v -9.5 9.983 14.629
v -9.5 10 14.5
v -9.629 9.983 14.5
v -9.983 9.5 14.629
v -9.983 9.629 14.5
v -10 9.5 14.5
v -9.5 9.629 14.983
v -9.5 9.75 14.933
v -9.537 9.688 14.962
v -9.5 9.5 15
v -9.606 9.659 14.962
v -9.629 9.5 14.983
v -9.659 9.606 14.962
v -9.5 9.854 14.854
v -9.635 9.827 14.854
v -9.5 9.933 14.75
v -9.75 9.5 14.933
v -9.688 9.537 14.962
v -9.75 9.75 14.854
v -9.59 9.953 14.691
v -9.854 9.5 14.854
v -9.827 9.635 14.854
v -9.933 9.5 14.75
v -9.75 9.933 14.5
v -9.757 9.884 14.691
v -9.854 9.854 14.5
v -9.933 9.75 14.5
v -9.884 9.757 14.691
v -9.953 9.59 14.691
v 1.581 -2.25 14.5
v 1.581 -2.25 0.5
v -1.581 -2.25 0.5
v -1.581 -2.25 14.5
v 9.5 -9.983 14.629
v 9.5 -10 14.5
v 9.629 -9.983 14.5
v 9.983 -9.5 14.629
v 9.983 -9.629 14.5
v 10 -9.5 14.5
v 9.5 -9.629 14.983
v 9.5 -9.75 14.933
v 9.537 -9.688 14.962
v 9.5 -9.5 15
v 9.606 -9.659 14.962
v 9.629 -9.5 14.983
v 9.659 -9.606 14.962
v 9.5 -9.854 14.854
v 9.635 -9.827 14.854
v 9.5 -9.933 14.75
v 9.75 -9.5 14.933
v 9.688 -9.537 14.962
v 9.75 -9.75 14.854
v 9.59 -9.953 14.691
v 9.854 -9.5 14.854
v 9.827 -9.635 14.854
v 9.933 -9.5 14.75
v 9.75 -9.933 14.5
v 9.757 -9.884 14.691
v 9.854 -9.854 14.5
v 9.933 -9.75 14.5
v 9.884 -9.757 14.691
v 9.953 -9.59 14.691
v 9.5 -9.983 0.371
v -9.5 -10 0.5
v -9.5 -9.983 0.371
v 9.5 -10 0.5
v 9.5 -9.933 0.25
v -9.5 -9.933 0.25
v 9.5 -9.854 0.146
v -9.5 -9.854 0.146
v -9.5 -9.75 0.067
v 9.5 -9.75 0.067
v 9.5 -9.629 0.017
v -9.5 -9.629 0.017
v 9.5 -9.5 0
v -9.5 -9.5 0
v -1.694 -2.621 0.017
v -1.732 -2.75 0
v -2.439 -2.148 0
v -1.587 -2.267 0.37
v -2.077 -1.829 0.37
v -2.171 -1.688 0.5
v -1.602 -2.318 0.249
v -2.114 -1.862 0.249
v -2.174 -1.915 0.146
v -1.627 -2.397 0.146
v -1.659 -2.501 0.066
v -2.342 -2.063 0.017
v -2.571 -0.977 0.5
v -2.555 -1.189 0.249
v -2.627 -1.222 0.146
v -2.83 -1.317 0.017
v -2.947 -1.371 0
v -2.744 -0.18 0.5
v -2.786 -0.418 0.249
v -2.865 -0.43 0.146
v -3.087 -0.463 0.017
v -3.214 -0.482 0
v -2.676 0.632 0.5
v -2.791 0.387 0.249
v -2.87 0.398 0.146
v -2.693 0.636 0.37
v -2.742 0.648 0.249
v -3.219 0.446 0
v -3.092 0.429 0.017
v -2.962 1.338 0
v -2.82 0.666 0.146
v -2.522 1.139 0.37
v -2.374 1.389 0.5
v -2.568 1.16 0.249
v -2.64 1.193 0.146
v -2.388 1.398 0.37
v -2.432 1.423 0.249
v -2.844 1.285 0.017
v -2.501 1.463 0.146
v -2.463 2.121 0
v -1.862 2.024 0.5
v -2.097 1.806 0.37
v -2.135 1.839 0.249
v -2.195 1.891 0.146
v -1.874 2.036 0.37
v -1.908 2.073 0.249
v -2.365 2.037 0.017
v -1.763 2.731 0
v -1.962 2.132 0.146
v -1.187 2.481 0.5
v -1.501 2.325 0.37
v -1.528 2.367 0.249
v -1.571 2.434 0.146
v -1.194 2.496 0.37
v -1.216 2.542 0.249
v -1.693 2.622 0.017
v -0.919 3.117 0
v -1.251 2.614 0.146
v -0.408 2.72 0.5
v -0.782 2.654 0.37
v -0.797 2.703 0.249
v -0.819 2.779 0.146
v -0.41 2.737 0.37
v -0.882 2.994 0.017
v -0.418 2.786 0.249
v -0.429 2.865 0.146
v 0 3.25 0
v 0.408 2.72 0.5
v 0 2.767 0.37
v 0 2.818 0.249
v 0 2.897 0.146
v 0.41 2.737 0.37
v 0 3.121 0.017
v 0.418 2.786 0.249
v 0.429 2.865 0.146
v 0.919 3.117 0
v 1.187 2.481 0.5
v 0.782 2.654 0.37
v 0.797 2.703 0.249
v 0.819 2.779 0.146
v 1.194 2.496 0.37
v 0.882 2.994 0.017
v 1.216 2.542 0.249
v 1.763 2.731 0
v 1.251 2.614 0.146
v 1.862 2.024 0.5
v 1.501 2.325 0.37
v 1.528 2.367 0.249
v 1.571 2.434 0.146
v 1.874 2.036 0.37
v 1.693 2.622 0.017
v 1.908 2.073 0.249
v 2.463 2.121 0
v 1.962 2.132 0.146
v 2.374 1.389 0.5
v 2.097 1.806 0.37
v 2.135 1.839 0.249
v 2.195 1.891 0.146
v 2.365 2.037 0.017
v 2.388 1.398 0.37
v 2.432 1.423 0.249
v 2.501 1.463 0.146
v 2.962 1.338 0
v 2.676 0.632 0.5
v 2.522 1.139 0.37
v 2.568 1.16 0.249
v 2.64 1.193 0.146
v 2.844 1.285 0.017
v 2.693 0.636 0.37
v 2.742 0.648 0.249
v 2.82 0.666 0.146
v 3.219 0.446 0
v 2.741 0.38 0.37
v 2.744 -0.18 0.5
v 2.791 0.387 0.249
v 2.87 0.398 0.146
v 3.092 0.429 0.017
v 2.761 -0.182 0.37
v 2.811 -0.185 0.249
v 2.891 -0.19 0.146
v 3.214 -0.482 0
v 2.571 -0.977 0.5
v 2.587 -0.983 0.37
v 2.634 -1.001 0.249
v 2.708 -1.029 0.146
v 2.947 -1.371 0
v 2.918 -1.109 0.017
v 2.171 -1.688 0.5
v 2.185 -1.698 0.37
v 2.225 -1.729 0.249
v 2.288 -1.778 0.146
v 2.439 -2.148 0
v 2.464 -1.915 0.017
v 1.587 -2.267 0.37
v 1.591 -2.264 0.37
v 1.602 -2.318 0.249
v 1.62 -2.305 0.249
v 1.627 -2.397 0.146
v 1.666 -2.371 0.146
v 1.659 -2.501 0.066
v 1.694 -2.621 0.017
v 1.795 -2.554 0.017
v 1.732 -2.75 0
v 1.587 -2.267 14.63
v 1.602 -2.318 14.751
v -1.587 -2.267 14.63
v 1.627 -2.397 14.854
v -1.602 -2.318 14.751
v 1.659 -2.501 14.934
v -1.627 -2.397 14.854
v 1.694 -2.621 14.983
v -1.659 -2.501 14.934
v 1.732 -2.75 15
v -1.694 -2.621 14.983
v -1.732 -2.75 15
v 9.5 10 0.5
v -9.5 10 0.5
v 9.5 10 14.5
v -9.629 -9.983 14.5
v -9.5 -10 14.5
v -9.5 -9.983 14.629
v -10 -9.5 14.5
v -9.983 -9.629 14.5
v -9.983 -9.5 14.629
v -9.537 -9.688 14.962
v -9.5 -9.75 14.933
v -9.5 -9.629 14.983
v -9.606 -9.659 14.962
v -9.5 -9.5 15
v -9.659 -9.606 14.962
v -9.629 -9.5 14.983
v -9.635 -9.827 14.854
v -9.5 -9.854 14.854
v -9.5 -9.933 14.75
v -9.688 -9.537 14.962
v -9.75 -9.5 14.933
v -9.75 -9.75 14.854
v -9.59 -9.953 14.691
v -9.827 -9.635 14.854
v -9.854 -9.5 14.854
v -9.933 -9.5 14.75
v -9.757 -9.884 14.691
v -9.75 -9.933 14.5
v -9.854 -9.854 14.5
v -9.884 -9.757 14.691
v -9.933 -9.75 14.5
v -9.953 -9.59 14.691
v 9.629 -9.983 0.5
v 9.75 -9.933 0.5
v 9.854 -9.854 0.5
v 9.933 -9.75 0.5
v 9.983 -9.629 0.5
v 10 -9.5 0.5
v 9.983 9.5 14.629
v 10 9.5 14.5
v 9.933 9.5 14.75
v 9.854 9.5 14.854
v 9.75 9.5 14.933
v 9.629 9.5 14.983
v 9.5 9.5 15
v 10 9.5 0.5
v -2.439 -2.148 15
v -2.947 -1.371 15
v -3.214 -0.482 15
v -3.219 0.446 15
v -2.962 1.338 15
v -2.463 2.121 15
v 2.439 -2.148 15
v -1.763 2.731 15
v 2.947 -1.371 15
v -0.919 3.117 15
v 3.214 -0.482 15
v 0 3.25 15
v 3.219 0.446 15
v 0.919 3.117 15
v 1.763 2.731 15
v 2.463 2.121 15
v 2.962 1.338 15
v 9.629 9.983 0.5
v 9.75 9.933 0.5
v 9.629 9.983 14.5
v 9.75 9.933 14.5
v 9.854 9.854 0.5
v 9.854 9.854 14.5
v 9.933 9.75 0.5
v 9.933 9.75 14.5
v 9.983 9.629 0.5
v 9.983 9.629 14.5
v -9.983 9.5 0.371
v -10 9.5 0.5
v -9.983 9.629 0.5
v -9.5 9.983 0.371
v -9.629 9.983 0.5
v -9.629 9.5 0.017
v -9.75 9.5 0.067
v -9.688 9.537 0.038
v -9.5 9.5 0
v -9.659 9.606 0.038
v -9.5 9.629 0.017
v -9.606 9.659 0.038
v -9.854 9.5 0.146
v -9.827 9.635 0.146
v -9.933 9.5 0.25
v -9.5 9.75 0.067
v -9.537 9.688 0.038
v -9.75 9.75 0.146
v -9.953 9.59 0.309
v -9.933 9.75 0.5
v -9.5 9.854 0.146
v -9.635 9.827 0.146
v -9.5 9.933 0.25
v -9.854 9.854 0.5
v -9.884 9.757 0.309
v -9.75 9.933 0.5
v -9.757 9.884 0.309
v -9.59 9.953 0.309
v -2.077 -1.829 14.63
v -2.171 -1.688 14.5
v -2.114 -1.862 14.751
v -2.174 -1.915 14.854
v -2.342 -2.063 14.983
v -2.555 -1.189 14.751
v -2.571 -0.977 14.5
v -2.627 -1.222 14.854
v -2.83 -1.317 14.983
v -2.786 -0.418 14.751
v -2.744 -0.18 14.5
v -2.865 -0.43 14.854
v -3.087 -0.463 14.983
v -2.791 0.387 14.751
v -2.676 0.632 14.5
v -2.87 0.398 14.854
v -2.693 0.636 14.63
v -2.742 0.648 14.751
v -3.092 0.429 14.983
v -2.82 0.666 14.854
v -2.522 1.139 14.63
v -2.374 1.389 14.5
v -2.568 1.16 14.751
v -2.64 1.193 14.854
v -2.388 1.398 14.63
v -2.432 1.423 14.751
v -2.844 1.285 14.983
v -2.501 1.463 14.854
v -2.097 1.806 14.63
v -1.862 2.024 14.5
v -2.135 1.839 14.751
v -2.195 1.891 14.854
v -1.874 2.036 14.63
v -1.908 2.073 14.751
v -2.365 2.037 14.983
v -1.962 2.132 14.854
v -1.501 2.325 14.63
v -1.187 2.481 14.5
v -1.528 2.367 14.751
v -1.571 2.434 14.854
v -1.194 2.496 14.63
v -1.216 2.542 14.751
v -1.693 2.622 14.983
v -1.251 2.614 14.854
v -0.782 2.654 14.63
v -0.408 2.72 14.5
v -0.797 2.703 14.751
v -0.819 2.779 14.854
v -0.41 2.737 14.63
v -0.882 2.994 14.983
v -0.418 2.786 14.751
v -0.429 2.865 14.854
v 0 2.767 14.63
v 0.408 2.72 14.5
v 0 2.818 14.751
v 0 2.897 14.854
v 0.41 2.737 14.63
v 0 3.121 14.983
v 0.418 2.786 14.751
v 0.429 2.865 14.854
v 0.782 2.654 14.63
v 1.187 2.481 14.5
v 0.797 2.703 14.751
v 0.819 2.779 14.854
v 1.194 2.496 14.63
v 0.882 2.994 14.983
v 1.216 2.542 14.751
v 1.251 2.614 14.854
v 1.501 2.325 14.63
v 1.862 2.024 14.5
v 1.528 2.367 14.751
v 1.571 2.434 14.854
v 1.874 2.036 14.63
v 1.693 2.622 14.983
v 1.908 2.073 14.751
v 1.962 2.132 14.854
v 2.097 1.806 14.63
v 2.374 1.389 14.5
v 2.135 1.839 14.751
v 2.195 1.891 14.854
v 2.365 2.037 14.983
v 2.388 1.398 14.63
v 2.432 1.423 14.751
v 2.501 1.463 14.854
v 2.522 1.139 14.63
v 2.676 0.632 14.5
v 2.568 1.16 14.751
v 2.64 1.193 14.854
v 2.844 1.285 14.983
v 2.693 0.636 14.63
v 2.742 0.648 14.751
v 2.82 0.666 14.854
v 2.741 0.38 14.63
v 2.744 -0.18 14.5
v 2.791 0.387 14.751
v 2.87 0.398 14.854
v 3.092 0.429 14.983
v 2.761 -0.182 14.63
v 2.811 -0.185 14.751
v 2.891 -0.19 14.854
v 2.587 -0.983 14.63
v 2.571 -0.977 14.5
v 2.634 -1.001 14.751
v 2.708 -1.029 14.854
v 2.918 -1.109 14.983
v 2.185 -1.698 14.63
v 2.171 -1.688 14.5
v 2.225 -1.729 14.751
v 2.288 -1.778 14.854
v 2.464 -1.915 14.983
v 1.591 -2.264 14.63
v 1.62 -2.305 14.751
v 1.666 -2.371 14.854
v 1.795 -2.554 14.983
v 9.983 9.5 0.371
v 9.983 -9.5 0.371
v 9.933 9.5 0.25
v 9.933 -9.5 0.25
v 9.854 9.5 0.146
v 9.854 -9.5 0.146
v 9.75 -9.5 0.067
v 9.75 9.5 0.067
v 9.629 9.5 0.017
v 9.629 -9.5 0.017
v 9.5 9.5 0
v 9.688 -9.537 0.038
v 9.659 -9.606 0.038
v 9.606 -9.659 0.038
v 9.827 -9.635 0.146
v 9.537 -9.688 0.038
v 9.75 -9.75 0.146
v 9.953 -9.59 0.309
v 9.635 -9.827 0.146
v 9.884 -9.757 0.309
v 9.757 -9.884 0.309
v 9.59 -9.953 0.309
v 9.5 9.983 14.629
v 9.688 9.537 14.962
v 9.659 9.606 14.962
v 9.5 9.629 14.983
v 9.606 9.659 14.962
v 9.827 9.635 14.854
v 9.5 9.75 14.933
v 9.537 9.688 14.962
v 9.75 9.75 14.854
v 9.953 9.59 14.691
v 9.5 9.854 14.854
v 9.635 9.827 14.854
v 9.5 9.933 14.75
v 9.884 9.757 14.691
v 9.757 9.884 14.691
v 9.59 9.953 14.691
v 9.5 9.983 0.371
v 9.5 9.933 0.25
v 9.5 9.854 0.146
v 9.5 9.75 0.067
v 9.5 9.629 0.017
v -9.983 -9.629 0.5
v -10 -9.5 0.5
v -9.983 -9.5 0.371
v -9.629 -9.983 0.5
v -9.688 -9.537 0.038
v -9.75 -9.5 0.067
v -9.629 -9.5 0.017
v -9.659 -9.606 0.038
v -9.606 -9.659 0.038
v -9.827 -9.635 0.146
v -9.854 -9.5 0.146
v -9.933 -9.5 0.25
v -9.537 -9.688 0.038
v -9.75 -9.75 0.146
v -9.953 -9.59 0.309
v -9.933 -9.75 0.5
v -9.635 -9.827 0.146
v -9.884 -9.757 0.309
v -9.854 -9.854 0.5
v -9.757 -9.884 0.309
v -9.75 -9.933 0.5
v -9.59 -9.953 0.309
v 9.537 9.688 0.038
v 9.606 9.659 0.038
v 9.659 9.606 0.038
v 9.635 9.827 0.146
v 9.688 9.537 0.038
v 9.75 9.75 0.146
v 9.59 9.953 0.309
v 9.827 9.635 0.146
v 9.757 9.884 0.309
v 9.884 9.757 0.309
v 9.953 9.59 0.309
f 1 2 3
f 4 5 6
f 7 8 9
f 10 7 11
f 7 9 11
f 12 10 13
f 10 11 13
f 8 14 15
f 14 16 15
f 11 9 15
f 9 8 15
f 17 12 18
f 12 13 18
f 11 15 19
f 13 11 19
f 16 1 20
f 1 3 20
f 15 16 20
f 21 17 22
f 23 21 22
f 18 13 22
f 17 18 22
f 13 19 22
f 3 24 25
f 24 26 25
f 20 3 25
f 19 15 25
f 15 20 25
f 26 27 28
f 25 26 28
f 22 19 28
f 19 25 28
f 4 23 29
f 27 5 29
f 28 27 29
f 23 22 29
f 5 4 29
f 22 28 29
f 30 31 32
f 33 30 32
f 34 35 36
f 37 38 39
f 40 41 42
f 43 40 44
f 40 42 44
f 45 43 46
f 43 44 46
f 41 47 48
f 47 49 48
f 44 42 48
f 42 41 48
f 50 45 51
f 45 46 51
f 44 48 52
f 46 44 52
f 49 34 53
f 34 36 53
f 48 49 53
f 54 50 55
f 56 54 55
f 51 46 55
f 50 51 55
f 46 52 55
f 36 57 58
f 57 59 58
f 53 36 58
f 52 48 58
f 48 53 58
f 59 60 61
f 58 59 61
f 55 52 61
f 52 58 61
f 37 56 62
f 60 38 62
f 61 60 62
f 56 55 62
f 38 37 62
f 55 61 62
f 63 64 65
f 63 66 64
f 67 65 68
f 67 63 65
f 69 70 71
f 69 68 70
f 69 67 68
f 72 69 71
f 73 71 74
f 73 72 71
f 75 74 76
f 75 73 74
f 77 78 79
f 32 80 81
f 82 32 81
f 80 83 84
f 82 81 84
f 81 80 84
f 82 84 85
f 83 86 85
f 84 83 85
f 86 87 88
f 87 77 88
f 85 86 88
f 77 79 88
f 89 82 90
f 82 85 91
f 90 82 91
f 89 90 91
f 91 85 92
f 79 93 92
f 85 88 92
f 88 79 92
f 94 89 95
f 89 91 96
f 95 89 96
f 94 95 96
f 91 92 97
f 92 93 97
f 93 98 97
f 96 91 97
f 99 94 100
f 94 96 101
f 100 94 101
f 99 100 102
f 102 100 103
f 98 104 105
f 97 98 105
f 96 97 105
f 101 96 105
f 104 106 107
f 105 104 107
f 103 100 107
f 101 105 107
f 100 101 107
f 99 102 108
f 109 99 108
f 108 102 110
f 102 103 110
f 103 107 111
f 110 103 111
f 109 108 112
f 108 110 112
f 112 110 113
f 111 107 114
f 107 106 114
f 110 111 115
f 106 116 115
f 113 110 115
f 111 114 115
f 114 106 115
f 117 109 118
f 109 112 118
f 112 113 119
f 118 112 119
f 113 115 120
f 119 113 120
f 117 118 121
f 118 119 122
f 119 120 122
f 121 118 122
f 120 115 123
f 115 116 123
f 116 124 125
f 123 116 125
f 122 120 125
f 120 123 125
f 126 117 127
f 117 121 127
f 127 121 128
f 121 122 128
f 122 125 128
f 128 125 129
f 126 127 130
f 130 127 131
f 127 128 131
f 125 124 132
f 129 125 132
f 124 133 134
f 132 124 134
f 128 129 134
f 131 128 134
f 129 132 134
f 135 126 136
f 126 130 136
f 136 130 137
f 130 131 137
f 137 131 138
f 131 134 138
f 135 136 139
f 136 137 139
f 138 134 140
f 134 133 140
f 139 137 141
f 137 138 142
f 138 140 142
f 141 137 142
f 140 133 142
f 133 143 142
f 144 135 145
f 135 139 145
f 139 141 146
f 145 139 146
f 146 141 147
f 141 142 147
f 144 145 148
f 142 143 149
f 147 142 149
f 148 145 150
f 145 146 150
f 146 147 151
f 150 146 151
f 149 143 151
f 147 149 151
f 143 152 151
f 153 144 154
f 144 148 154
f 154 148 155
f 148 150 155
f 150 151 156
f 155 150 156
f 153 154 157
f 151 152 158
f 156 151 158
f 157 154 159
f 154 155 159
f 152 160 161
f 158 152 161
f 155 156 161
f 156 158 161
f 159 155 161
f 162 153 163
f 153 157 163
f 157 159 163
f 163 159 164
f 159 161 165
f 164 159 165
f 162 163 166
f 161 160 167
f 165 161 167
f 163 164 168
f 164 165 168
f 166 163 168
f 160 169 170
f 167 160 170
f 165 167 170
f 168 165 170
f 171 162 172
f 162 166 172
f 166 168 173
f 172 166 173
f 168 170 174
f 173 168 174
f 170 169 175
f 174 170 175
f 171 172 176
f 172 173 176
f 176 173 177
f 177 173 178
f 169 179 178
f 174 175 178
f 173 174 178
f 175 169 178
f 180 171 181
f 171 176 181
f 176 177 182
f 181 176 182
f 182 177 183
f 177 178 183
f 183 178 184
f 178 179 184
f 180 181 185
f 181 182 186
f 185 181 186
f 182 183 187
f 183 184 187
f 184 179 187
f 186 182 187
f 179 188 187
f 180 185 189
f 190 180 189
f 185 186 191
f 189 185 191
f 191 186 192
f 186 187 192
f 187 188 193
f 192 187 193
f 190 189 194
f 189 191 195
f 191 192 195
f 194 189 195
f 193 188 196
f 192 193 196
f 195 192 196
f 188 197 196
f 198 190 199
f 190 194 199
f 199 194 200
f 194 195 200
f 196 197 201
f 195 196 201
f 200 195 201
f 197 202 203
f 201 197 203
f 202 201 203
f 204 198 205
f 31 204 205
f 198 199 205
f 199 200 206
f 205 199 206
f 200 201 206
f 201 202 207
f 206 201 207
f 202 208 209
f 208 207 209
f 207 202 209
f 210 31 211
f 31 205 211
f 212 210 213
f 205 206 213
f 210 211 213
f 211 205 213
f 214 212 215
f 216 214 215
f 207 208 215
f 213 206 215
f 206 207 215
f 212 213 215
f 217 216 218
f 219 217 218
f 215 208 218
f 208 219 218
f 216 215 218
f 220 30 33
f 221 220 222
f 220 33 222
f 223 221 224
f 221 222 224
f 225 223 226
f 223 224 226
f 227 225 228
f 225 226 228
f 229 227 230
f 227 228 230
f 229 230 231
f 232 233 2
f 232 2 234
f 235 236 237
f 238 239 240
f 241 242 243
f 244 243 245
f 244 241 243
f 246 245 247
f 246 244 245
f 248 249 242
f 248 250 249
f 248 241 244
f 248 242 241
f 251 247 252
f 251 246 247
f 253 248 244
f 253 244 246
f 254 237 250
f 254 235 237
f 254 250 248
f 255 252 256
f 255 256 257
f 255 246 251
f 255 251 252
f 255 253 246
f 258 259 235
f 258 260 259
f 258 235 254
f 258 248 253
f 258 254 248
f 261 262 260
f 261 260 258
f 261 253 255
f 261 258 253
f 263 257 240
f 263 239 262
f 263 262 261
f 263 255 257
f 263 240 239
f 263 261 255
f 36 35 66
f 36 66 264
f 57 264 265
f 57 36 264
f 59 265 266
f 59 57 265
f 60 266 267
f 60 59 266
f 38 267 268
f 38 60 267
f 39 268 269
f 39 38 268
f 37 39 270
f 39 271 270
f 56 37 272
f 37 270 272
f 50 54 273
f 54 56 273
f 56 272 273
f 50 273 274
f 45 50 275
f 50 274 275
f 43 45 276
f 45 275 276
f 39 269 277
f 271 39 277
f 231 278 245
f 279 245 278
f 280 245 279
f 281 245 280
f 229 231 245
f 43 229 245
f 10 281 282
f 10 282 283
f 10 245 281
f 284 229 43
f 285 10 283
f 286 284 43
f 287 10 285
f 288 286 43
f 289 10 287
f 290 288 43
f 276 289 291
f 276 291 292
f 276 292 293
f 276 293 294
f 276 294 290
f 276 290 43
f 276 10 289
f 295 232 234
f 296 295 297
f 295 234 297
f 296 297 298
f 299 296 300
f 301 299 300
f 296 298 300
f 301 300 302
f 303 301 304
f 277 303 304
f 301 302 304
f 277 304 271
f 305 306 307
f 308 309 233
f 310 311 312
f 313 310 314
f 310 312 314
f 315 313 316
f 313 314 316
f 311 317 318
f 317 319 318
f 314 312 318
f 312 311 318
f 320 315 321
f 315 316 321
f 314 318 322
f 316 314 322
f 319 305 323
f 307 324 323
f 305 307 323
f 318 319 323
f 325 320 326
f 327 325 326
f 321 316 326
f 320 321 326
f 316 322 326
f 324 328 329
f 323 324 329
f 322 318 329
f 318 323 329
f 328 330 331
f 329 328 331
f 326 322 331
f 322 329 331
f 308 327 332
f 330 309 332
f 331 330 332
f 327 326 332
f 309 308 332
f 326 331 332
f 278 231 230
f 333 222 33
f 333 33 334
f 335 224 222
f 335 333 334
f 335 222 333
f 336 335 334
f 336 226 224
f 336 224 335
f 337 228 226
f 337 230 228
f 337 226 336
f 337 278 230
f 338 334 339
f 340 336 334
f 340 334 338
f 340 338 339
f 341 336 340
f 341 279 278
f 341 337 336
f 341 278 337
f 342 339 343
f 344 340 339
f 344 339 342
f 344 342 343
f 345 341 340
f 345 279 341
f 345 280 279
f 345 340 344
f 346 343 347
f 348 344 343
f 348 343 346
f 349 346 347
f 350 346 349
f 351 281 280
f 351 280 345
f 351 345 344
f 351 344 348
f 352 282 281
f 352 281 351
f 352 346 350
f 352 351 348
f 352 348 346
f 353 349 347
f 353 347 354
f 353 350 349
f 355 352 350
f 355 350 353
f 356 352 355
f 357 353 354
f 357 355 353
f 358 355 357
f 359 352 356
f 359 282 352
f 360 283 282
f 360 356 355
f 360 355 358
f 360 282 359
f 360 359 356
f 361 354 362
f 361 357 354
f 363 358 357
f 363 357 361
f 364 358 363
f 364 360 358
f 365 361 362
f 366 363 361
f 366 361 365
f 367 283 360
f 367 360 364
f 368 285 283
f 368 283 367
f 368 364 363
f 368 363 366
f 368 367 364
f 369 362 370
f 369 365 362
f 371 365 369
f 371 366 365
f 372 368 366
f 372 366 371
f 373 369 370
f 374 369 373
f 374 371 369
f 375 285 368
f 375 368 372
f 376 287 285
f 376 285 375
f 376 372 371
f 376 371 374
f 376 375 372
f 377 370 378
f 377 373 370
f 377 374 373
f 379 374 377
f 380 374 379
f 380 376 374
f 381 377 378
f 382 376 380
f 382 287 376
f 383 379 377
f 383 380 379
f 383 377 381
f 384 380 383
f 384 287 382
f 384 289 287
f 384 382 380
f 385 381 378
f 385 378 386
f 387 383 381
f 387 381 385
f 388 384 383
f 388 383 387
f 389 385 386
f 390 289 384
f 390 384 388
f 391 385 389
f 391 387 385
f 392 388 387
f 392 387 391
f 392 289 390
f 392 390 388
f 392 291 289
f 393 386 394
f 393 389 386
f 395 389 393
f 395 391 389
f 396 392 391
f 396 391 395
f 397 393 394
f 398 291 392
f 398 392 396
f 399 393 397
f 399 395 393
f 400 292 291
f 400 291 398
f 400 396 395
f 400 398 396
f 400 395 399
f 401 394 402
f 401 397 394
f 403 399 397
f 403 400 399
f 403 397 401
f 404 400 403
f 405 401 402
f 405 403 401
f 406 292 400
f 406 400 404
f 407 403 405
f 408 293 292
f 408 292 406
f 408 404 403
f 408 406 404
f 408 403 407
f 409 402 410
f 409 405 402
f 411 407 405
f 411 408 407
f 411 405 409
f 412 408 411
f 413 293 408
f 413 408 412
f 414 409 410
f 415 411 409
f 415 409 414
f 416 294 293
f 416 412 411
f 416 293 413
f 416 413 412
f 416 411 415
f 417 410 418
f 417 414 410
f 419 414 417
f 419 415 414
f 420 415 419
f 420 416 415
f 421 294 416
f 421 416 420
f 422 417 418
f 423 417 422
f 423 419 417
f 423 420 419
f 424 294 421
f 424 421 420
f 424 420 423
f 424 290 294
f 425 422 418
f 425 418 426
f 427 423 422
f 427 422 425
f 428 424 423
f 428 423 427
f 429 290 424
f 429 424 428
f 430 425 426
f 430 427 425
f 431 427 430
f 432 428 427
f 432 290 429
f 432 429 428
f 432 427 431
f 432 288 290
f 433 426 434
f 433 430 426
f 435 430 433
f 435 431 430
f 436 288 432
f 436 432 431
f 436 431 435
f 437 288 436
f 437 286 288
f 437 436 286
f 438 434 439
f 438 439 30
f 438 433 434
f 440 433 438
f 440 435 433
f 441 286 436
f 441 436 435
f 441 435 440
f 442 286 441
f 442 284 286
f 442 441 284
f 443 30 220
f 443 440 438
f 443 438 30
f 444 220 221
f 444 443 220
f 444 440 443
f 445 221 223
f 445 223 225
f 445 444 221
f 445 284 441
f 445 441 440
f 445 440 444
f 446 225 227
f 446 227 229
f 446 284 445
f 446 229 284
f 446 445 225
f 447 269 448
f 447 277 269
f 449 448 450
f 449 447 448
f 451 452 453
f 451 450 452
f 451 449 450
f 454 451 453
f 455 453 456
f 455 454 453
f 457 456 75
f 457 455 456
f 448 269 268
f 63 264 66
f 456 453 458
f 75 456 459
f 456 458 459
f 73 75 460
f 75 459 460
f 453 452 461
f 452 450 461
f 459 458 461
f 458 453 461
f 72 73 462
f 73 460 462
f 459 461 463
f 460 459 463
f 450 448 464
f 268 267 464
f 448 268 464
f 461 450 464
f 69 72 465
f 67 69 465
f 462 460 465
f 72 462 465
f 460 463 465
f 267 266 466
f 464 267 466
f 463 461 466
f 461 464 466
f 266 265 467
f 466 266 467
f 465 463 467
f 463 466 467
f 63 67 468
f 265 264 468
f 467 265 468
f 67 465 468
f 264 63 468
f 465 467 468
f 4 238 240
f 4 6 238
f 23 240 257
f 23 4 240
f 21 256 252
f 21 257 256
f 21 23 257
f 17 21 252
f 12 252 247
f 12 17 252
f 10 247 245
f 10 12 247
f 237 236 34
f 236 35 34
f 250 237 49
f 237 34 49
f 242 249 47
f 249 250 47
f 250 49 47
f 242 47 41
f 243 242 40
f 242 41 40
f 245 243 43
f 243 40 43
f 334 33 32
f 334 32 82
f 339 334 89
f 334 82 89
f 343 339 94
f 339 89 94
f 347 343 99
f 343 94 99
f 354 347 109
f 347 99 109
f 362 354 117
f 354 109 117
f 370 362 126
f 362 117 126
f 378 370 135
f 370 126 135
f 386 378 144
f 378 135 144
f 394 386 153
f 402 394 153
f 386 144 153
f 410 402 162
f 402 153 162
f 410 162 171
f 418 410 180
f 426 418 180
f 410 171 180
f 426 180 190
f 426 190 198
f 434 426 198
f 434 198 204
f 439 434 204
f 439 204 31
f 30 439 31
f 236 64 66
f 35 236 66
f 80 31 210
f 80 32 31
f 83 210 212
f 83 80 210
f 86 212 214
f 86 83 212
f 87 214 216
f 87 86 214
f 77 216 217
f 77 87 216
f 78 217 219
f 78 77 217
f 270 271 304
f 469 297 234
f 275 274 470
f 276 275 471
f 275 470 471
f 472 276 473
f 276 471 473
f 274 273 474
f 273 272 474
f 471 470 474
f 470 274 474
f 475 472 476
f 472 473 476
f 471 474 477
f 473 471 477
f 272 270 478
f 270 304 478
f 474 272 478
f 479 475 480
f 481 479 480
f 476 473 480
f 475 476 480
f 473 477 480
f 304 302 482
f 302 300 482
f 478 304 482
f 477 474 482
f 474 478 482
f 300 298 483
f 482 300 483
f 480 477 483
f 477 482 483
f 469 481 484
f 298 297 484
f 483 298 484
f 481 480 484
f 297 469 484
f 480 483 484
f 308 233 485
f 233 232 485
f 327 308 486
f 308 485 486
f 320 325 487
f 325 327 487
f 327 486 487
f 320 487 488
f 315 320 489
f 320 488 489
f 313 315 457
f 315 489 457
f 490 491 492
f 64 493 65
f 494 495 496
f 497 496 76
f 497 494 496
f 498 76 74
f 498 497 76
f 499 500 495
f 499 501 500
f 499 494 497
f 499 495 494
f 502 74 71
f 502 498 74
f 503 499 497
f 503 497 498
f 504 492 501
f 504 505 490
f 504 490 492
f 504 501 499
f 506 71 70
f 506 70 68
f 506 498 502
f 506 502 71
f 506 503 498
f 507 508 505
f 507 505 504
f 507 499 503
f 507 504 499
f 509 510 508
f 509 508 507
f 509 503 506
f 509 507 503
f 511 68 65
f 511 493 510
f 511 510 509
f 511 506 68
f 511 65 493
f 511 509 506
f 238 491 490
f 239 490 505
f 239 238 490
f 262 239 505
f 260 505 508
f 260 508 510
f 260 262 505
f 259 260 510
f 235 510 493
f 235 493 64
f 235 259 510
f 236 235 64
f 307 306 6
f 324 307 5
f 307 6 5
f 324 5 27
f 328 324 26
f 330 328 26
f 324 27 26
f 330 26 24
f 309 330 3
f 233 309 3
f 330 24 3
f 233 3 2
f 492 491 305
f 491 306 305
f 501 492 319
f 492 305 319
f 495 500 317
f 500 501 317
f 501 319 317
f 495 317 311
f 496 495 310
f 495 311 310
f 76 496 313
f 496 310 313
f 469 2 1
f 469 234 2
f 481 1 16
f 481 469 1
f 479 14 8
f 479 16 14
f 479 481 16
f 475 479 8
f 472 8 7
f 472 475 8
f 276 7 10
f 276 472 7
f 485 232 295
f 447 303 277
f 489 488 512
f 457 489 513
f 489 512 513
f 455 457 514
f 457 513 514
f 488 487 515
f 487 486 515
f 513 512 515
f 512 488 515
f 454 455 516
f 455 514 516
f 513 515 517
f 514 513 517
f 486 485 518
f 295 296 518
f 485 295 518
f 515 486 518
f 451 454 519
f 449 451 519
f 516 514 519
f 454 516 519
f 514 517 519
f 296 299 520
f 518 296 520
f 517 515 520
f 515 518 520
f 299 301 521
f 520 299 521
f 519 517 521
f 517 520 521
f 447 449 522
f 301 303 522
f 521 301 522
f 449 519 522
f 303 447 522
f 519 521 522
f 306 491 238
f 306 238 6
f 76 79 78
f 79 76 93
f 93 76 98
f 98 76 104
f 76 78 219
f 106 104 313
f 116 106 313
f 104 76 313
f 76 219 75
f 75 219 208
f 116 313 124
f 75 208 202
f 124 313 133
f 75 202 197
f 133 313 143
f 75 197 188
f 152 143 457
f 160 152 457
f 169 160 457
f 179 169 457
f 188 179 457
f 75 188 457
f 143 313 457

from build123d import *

# Parameters (mm, degrees)
ESQUISSE1_W        = 20
ESQUISSE1_H        = 20
BOSS_EXTRU_1_DEPTH = 15
CONG_1_R           = 0.5


with BuildPart() as part:
    # Esquisse1 → Boss.-Extru.1 (new body)
    with BuildSketch(Plane.XY):
        Rectangle(ESQUISSE1_W, ESQUISSE1_H)
        with BuildLine():
            Line((1.58113883, -2.25), (-1.58113883, -2.25))
            ThreePointArc((-1.58113883, -2.25), (0, 2.75), (1.58113883, -2.25))
        make_face(mode=Mode.SUBTRACT)
    extrude(amount=BOSS_EXTRU_1_DEPTH)

    # Congé1
    cong_1_edges = [part.edges().sort_by_distance(p)[0] for p in [
        (0, -2.25, 0),
        (0, 2.75, 0),
        (0, -2.25, 15),
        (-10, -10, 7.5),
        (-10, 10, 7.5),
        (10, 10, 7.5),
        (10, -10, 7.5),
        (0, -10, 15),
        (10, 0, 15),
        (0, 10, 15),
        (-10, 0, 15),
        (0, 2.75, 15),
        (-10, 0, 0),
        (0, 10, 0),
        (10, 0, 0),
        (0, -10, 0),
    ]]
    fillet(cong_1_edges, radius=CONG_1_R)


solid = part.part
